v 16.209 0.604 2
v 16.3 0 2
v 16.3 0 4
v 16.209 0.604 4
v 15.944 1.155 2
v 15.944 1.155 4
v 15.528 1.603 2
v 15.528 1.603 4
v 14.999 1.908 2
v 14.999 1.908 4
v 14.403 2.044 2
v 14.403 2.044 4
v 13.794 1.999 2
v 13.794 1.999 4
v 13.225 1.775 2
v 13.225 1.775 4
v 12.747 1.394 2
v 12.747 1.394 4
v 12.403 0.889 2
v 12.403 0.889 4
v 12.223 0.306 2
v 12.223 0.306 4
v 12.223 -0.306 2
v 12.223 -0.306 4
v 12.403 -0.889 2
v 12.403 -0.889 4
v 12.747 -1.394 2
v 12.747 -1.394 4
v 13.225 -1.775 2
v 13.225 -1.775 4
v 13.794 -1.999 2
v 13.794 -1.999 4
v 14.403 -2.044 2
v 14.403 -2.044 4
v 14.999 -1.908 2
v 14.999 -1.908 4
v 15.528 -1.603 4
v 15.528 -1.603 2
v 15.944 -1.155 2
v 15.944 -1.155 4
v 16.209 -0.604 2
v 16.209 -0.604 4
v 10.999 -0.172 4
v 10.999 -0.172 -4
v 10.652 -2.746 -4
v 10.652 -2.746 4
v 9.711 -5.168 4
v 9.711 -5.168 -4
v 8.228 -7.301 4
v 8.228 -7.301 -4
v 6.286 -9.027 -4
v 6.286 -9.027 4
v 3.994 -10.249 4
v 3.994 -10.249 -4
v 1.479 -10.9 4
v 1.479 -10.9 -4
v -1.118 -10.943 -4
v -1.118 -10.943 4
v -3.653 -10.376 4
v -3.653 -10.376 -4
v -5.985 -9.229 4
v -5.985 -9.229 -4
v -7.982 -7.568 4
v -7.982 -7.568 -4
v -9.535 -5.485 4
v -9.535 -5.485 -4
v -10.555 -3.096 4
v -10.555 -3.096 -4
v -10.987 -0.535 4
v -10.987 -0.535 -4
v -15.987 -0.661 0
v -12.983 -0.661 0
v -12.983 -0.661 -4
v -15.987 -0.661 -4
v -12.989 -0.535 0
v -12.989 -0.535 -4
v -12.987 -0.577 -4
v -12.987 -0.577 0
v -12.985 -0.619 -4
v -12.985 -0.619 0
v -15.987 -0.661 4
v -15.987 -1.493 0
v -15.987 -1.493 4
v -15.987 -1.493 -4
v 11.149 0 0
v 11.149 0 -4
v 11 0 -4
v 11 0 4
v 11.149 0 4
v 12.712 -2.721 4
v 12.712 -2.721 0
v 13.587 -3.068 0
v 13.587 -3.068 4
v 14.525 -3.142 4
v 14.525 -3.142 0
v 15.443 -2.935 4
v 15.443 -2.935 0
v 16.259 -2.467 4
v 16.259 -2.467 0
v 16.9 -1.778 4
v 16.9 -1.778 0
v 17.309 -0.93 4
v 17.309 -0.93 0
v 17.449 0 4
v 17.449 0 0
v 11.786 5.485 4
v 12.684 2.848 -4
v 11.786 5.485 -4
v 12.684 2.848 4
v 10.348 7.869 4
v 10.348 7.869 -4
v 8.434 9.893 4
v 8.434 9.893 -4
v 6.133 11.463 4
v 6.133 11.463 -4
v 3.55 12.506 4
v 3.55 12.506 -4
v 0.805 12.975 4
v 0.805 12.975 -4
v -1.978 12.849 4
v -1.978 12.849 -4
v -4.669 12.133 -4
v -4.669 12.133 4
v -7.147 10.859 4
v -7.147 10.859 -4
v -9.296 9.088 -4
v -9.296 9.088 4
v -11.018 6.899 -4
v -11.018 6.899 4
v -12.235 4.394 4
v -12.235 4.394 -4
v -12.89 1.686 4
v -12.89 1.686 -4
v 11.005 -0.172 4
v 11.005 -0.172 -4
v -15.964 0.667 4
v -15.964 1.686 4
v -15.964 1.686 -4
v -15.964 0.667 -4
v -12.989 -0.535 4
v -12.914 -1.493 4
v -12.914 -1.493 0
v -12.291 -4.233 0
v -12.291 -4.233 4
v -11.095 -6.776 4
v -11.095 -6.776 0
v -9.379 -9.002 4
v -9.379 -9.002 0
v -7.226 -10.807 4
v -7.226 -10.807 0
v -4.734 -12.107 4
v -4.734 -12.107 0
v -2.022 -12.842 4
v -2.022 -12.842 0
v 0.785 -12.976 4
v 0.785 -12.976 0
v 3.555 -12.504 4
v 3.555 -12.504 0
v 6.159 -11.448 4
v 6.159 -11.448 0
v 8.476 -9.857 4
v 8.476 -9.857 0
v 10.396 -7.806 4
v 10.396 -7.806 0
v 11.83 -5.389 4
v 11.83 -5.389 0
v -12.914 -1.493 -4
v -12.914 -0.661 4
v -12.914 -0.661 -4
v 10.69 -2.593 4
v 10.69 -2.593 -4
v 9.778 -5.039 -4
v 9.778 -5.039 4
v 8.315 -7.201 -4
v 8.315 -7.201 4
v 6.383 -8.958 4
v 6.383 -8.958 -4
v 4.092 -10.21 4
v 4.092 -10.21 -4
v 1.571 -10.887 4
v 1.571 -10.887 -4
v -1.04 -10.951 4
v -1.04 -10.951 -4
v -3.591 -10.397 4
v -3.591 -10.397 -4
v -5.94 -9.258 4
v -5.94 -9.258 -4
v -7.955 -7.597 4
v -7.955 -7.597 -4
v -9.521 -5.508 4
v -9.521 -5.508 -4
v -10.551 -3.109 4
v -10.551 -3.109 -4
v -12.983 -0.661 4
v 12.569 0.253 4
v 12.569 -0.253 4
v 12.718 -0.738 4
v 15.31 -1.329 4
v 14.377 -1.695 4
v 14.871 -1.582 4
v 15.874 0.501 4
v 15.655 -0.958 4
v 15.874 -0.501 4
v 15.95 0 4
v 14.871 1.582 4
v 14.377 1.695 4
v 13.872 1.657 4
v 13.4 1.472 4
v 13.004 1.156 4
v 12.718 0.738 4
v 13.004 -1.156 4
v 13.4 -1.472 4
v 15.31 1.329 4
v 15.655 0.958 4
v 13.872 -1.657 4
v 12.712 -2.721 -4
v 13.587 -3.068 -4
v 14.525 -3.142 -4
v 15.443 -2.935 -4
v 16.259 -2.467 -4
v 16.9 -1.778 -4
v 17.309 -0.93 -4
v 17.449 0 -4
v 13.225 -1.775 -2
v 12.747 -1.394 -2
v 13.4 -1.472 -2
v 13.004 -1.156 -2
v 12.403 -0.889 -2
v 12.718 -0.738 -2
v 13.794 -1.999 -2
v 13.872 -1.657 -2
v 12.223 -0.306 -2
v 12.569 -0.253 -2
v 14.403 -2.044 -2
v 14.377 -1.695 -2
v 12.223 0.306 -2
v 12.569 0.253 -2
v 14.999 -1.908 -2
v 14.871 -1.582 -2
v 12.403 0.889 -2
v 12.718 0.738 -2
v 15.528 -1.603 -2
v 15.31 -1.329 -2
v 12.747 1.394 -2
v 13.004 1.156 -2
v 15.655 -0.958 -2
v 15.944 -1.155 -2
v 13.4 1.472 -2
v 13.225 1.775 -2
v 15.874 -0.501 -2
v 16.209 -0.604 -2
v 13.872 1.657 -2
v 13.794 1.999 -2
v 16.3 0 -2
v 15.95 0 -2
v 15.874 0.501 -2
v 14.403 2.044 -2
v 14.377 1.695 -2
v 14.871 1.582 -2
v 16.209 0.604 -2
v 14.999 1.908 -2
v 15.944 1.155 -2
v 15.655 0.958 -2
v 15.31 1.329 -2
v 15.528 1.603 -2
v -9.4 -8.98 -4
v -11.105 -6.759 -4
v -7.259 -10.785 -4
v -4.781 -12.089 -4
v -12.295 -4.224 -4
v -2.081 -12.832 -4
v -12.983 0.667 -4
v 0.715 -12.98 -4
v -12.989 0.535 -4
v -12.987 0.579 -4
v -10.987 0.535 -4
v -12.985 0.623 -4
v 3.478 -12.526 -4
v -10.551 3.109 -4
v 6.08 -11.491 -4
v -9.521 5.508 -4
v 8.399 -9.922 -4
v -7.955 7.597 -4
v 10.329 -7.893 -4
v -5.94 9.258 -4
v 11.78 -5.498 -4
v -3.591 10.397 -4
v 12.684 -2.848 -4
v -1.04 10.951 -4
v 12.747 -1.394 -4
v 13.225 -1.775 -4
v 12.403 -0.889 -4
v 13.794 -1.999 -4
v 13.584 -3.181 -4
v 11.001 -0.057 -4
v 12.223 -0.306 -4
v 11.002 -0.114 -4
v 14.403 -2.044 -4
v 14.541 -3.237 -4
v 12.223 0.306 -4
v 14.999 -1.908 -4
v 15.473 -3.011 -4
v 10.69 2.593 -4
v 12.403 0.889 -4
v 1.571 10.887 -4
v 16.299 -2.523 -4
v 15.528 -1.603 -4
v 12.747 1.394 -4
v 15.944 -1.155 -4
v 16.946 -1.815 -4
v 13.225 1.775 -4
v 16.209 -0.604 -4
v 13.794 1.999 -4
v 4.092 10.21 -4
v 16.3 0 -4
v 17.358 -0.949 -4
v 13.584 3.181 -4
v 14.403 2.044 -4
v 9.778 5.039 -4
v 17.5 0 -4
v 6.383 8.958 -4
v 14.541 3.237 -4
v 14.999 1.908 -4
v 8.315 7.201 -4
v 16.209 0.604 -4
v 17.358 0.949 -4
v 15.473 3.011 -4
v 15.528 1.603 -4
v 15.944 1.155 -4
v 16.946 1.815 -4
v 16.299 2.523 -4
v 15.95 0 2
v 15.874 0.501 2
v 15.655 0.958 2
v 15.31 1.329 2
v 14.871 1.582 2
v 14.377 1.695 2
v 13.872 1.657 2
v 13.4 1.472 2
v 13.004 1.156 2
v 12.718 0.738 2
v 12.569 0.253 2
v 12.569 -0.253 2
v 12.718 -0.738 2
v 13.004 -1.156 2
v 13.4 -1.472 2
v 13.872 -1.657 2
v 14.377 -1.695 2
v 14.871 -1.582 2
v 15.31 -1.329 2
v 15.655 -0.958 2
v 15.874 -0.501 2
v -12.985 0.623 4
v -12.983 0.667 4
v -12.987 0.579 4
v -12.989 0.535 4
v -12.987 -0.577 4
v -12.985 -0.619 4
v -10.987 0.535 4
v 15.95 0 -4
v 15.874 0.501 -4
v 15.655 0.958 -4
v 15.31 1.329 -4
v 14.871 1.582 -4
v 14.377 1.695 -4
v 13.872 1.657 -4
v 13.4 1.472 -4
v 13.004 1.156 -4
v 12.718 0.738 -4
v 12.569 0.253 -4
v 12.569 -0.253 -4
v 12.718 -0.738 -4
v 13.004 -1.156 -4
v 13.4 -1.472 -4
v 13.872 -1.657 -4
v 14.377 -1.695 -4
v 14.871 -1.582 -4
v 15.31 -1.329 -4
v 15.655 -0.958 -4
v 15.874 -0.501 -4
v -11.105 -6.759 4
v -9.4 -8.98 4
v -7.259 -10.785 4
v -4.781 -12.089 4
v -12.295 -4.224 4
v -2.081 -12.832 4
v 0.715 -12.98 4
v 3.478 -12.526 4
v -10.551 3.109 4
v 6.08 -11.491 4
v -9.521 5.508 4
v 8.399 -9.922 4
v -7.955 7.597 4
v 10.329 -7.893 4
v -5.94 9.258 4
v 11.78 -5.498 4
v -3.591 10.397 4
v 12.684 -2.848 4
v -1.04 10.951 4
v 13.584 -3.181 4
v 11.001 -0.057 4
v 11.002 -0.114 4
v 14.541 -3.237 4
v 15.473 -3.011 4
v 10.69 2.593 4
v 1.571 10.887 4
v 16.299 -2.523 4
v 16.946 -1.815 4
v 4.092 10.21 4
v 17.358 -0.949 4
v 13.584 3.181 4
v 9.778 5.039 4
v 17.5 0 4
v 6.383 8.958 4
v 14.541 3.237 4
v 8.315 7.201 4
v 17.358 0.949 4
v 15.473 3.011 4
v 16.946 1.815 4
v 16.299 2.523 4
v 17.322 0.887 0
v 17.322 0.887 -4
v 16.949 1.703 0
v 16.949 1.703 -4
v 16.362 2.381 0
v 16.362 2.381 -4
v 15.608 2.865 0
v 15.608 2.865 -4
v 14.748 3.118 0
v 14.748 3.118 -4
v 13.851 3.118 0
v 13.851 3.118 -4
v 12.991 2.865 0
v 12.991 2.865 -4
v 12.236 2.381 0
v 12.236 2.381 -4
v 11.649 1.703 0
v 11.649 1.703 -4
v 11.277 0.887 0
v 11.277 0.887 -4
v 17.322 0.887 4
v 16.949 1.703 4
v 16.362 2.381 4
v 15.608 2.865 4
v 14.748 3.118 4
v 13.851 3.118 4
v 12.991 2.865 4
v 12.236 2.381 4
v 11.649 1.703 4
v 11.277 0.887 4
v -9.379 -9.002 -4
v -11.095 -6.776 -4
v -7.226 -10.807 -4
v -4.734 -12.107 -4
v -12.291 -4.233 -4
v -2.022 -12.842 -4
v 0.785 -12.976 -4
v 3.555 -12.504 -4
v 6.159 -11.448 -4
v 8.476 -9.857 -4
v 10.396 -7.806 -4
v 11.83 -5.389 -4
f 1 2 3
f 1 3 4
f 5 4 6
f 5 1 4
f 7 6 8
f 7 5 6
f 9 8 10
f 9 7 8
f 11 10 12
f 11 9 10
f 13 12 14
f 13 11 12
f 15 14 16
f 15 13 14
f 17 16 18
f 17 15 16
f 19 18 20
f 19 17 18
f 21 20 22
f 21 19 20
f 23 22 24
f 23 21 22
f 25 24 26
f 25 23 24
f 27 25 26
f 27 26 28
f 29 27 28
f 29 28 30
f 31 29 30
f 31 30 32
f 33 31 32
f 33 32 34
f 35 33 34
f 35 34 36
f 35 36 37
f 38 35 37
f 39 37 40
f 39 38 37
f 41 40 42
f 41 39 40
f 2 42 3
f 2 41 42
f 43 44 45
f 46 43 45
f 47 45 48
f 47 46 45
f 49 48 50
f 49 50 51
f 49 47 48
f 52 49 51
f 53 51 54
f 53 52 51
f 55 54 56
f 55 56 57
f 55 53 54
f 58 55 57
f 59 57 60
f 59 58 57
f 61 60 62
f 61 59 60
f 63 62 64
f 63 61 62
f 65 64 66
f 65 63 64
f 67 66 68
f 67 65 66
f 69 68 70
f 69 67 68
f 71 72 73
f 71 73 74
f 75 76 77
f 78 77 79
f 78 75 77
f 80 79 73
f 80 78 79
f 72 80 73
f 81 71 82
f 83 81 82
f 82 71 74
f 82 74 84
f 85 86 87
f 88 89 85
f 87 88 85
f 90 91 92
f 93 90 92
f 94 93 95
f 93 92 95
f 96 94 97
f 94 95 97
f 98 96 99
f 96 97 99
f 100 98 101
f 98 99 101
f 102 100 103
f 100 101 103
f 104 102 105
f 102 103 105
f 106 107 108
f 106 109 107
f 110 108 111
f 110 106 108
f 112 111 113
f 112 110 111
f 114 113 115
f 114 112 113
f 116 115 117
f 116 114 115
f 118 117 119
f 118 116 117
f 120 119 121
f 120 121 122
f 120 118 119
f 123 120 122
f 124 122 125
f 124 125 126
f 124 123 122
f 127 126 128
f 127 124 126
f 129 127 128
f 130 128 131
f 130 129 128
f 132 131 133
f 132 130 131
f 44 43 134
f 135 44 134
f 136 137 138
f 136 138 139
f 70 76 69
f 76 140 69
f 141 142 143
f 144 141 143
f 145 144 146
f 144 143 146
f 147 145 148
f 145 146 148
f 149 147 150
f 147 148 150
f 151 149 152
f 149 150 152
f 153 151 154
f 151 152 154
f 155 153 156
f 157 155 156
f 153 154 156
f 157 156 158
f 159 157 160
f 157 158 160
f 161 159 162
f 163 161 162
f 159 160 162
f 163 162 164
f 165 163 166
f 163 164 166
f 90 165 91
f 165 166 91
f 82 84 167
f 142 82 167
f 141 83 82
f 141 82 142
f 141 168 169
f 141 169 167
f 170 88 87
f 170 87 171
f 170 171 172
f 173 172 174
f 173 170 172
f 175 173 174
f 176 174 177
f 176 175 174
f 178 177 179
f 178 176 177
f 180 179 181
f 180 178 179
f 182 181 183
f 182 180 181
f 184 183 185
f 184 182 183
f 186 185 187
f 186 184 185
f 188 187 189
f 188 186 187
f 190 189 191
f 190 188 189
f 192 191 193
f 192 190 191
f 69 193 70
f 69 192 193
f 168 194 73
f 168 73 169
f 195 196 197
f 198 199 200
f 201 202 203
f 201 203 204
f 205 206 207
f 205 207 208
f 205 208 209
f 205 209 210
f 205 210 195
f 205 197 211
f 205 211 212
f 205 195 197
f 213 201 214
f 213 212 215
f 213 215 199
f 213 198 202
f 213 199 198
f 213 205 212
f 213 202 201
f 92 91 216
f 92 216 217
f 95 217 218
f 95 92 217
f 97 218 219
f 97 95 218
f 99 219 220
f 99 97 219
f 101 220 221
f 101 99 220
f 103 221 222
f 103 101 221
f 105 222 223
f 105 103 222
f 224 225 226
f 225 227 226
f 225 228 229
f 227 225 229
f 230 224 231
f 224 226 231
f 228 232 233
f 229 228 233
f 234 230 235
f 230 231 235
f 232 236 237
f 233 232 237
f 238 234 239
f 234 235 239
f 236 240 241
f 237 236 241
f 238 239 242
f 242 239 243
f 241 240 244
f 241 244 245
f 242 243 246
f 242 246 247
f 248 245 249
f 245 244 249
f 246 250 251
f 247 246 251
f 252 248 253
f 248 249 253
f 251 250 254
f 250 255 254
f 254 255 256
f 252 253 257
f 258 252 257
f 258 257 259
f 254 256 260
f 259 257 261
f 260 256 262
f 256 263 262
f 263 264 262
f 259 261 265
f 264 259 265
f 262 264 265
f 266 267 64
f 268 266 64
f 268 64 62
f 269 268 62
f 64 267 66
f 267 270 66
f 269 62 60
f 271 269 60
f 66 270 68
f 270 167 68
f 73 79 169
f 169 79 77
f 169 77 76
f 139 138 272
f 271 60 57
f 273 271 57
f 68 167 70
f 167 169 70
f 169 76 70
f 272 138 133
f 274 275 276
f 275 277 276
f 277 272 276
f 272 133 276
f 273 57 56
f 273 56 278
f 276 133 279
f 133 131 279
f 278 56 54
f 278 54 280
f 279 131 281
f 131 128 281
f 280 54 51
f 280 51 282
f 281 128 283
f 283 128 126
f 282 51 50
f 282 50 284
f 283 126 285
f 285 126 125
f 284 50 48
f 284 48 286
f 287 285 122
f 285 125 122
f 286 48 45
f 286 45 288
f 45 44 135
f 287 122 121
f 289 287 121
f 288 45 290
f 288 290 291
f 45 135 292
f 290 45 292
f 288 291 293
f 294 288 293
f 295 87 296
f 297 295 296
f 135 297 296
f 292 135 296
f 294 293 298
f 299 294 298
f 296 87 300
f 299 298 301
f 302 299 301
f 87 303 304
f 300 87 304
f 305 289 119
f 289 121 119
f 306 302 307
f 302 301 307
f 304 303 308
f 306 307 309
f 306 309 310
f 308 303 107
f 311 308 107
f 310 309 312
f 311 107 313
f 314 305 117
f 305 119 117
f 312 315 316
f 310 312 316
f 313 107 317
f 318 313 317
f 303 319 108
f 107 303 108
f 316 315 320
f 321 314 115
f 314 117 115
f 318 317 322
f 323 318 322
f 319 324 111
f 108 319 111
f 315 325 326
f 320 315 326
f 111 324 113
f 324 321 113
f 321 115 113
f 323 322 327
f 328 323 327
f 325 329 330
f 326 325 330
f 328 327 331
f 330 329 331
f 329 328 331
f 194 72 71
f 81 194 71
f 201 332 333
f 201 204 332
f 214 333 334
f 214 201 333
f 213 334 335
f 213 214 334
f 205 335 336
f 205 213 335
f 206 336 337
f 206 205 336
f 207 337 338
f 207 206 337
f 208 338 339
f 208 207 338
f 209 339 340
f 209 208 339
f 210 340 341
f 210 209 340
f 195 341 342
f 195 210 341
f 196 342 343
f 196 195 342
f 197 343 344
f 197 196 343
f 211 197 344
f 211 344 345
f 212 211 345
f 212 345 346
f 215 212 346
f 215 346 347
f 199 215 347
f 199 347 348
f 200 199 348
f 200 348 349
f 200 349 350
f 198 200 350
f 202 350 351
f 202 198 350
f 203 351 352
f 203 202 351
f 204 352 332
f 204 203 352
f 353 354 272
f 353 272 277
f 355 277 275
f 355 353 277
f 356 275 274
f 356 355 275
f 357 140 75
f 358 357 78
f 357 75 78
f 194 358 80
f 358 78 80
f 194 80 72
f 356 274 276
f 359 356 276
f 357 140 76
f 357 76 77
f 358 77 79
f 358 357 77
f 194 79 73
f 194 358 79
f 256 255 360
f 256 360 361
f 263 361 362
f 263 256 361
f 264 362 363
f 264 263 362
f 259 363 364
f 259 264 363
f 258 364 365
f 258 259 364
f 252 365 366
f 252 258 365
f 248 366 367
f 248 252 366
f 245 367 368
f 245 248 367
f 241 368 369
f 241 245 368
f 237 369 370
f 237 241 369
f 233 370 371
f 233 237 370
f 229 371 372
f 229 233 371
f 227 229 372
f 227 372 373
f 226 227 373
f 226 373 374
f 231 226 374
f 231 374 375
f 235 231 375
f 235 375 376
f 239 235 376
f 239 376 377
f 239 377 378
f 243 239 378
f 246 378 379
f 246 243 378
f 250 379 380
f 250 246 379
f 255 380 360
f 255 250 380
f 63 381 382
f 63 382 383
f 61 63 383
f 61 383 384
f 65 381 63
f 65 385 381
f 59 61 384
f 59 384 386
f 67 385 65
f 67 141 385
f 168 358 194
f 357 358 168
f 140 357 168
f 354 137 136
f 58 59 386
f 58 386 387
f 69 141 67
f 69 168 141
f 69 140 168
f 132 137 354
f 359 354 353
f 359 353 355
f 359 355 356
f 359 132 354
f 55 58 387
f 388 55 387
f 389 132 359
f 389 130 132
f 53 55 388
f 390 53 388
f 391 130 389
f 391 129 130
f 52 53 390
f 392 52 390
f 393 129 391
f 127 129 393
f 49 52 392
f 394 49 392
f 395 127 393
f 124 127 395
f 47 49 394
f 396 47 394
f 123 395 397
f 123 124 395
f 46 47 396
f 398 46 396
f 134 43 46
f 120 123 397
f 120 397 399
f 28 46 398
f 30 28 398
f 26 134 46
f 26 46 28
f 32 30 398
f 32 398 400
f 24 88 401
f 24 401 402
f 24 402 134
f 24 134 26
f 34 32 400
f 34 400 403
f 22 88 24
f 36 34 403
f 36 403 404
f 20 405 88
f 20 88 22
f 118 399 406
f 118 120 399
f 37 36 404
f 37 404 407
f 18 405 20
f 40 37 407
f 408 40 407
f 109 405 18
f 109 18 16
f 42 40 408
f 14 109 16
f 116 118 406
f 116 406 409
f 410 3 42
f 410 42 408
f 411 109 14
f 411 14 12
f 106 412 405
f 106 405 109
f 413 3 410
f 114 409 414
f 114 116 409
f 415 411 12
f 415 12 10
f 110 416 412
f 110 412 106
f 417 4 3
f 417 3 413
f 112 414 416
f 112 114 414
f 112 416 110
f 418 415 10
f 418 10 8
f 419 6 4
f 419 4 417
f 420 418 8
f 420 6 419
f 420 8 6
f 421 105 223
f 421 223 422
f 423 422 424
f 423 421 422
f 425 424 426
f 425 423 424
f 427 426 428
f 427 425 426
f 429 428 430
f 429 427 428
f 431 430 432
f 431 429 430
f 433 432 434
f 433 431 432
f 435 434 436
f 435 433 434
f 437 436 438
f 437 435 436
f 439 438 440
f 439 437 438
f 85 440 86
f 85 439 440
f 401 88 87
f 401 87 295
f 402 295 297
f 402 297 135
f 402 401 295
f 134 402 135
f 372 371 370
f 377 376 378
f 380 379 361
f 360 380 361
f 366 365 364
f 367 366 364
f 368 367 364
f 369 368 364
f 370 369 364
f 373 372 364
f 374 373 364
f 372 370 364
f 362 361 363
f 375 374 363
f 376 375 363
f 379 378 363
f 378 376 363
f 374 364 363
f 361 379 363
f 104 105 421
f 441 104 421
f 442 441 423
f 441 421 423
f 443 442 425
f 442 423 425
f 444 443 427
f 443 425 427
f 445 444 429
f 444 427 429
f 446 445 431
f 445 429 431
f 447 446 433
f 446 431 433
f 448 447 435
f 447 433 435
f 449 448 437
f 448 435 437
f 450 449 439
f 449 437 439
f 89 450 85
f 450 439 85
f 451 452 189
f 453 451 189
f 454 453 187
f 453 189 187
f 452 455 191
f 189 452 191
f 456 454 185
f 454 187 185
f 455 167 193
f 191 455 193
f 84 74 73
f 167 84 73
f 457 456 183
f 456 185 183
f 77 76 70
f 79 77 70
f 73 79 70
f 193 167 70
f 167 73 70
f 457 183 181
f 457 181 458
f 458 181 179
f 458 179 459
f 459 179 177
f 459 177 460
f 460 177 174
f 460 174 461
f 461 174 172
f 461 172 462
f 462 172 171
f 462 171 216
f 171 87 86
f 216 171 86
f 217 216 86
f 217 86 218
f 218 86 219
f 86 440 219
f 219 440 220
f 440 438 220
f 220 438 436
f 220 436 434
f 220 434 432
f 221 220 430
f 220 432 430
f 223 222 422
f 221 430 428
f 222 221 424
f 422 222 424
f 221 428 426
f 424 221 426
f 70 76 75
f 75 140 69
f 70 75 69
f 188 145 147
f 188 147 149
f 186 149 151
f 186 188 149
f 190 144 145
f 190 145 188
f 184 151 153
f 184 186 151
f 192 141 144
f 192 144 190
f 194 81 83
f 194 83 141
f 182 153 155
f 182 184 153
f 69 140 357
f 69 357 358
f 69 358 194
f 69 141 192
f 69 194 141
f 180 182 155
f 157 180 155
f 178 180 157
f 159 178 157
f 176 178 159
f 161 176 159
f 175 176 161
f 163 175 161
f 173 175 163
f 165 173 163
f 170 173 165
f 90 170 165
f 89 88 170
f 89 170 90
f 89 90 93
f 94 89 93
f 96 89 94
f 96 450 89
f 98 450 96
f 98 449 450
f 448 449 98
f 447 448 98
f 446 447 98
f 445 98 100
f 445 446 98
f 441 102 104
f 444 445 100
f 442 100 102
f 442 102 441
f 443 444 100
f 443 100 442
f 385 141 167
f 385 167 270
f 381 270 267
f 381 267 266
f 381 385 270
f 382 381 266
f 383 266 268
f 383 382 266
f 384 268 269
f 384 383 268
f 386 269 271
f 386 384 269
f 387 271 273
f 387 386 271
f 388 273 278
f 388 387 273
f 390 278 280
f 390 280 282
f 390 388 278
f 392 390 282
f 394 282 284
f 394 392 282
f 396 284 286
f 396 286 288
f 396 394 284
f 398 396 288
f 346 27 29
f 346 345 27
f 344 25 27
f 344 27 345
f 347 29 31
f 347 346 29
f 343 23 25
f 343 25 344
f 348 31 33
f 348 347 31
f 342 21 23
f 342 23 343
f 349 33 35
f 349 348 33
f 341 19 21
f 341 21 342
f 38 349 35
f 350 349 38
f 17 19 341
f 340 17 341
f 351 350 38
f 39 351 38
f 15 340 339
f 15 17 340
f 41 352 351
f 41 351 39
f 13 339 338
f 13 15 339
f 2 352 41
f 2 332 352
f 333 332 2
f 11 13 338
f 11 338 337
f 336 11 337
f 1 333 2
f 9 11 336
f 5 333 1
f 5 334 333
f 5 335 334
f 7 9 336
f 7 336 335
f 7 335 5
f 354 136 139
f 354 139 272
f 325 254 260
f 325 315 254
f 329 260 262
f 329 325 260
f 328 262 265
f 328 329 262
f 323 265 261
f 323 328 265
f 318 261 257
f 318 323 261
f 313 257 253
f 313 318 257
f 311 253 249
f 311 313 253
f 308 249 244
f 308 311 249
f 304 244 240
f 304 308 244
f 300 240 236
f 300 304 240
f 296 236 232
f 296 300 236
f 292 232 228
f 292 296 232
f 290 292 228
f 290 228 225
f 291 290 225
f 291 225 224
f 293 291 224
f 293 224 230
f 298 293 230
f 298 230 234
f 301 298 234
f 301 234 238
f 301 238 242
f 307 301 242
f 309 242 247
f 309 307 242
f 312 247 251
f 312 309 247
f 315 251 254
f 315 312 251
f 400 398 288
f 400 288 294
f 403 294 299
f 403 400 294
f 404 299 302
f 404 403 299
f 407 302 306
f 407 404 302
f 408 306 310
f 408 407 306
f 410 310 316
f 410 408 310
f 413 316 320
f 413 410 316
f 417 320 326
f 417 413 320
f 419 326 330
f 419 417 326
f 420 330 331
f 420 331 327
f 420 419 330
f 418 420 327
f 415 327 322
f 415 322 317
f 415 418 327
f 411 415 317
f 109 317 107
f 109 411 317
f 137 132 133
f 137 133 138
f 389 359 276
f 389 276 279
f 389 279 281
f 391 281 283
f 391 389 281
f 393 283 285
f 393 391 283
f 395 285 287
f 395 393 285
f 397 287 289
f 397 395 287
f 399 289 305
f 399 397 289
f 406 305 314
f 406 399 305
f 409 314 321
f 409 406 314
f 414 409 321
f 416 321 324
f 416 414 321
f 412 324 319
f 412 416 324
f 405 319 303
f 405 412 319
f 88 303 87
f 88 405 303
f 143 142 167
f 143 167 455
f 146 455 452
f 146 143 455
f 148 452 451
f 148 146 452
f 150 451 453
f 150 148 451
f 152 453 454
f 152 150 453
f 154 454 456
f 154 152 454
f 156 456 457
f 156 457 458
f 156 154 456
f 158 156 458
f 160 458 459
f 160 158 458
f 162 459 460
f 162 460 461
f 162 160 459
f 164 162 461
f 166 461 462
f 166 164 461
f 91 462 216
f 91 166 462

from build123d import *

# Parameters (mm, degrees)
F0_R      = 2.05
F1_DEPTH  = 4
F2_DEPTH  = 2
F5_DEPTH  = 4
F6_W      = 7.8420564532
F6_H      = 1.0693569202
F7_DEPTH  = 4.5
F0_R_2    = 1.7
F8_DEPTH  = 2
F9_DEPTH  = 4
F10_W     = 1.5671141446
F10_H     = 0.3430901561
F11_DEPTH = 4
F12_DEPTH = 4
F13_DEPTH = 4
F14_DEPTH = 4


# Not quite as in the source:
# - the program builds the solid bodies; features that only make, move or delete a surface that nothing else refers to are left out


with BuildPart() as f1:
    # F0 (on Top) → F1 (new body, symmetric)
    with BuildSketch(Plane.XY):
        with BuildLine():
            ThreePointArc((-11, 0), (0, 11), (11, 0))
            ThreePointArc((11, 0), (11.4525622626, 1.6543403837), (12.6842105263, 2.8479472123))
            ThreePointArc((12.6842105263, 2.8479472123), (-0.5898274536, 12.986612475), (-12.8901523849, 1.6864078669))
            Line((-12.8901523849, 1.6864078669), (-12.8901523849, 0.6666785921))
            Line((-12.8901523849, 0.6666785921), (-12.9828941171, 0.6666785921))
            ThreePointArc((-12.9828941171, 0.6666785921), (-12.9957228256, 0.3334490052), (-13, 0))
            Line((-13, 0), (-11, 0))
        make_face()
        with BuildLine():
            ThreePointArc((12.6842105263, 2.8479472123), (11.4525622626, 1.6543403837), (11, 0))
            ThreePointArc((11, 0), (11.4525622626, -1.6543403837), (12.6842105263, -2.8479472123))
            ThreePointArc((12.6842105263, -2.8479472123), (15.9043403837, -2.7974377374), (17.5, 0))
            ThreePointArc((17.5, 0), (15.9043403837, 2.7974377374), (12.6842105263, 2.8479472123))
        make_face()
        with Locations((14.25, 0)):
            Circle(F0_R, mode=Mode.SUBTRACT)
        with BuildLine():
            Line((-12.8901523849, 0.6666785921), (-12.8901523849, 1.6864078669))
            ThreePointArc((-12.8901523849, 1.6864078669), (-12.9465669493, 1.1774566778), (-12.9828941171, 0.6666785921))
            Line((-12.9828941171, 0.6666785921), (-12.8901523849, 0.6666785921))
        make_face()
        with BuildLine():
            ThreePointArc((-12.9828941171, 0.6666785921), (-12.9465669493, 1.1774566778), (-12.8901523849, 1.6864078669))
            Line((-12.8901523849, 1.6864078669), (-15.9636270255, 1.6864078669))
            Line((-15.9636270255, 1.6864078669), (-15.9636270255, 0.6666785921))
            Line((-15.9636270255, 0.6666785921), (-12.9828941171, 0.6666785921))
        make_face()
    extrude(amount=F1_DEPTH, both=True)

    # F0 (on Top) → F2 (cut, symmetric)
    with BuildSketch(Plane.XY):
        with BuildLine():
            ThreePointArc((12.6842105263, 2.8479472123), (11.4525622626, 1.6543403837), (11, 0))
            ThreePointArc((11, 0), (11.4525622626, -1.6543403837), (12.6842105263, -2.8479472123))
            ThreePointArc((12.6842105263, -2.8479472123), (15.9043403837, -2.7974377374), (17.5, 0))
            ThreePointArc((17.5, 0), (15.9043403837, 2.7974377374), (12.6842105263, 2.8479472123))
        make_face()
        with Locations((14.25, 0)):
            Circle(F0_R, mode=Mode.SUBTRACT)
    extrude(amount=F2_DEPTH, both=True, mode=Mode.SUBTRACT)


with BuildPart() as f5:
    # F3 (on Top) → F5 (new body, symmetric)
    with BuildSketch(Plane.XY):
        with BuildLine():
            ThreePointArc((11, 0), (0, -11), (-11, 0))
            Line((-11, 0), (-13, 0))
            ThreePointArc((-13, 0), (-12.9957895083, -0.3308399253), (-12.9831607606, -0.6614655431))
            Line((-12.9831607606, -0.6614655431), (-12.9139886071, -0.6614655431))
            Line((-12.9139886071, -0.6614655431), (-12.9139886071, -1.4929495154))
            ThreePointArc((-12.9139886071, -1.4929495154), (-0.6222206293, -12.98510075), (12.7120691767, -2.7209000803))
            ThreePointArc((12.7120691767, -2.7209000803), (11.5677693449, -1.5688883132), (11.1492688343, 0))
            Line((11.1492688343, 0), (11, 0))
        make_face()
    extrude(amount=F5_DEPTH, both=True)


with BuildPart() as f7_tool:
    # F6 (on Top) → F7 (new body, symmetric)
    with BuildSketch(Plane.XY):
        with Locations((-13.9199756086, 0)):
            Rectangle(F6_W, F6_H)
    extrude(amount=F7_DEPTH, both=True)


with BuildPart() as f1_1:
    add(f1.part)

    # F7: cut by f7_tool
    add(f7_tool.part, mode=Mode.SUBTRACT)


with BuildPart() as f5_1:
    add(f5.part)

    # F7: cut by f7_tool
    add(f7_tool.part, mode=Mode.SUBTRACT)


with BuildPart() as f8:
    # F0 (on Top) → F8 (new body, symmetric)
    with BuildSketch(Plane.XY):
        with Locations((14.25, 0)):
            Circle(F0_R)
        with Locations((14.25, 0)):
            Circle(F0_R_2, mode=Mode.SUBTRACT)
    extrude(amount=F8_DEPTH, both=True)

    # F0 (on Top) → F9 (join, symmetric)
    with BuildSketch(Plane.XY):
        with Locations((14.25, 0)):
            Circle(F0_R_2)
    extrude(amount=F9_DEPTH, both=True)


with BuildPart() as f11_tool:
    # F10 (on Top) → F11 (new body, symmetric)
    with BuildSketch(Plane.XY):
        with Locations((11.4076789469, 0)):
            Rectangle(F10_W, F10_H)
    extrude(amount=F11_DEPTH, both=True)


with BuildPart() as f1_2:
    add(f1_1.part)

    # F11: cut by f11_tool
    add(f11_tool.part, mode=Mode.SUBTRACT)



with BuildPart() as f5_2:
    add(f5_1.part)

    # F11: cut by f11_tool
    add(f11_tool.part, mode=Mode.SUBTRACT)


with BuildPart() as f1_3:
    add(f1_2.part)

    add(f5_2.part)  # F12 merges F5

    add(f8.part)  # F12 merges F8
    # F0 (on Top) → F12 (join, symmetric)
    with BuildSketch(Plane.XY):
        with BuildLine():
            ThreePointArc((-11, 0), (0, 11), (11, 0))
            ThreePointArc((11, 0), (11.4525622626, 1.6543403837), (12.6842105263, 2.8479472123))
            ThreePointArc((12.6842105263, 2.8479472123), (-0.5898274536, 12.986612475), (-12.8901523849, 1.6864078669))
            Line((-12.8901523849, 1.6864078669), (-12.8901523849, 0.6666785921))
            Line((-12.8901523849, 0.6666785921), (-12.9828941171, 0.6666785921))
            ThreePointArc((-12.9828941171, 0.6666785921), (-12.9957228256, 0.3334490052), (-13, 0))
            Line((-13, 0), (-11, 0))
        make_face()
        with BuildLine():
            ThreePointArc((12.6842105263, 2.8479472123), (11.4525622626, 1.6543403837), (11, 0))
            ThreePointArc((11, 0), (11.4525622626, -1.6543403837), (12.6842105263, -2.8479472123))
            ThreePointArc((12.6842105263, -2.8479472123), (15.9043403837, -2.7974377374), (17.5, 0))
            ThreePointArc((17.5, 0), (15.9043403837, 2.7974377374), (12.6842105263, 2.8479472123))
        make_face()
        with Locations((14.25, 0)):
            Circle(F0_R, mode=Mode.SUBTRACT)
        with BuildLine():
            Line((-12.8901523849, 0.6666785921), (-12.8901523849, 1.6864078669))
            ThreePointArc((-12.8901523849, 1.6864078669), (-12.9465669493, 1.1774566778), (-12.9828941171, 0.6666785921))
            Line((-12.9828941171, 0.6666785921), (-12.8901523849, 0.6666785921))
        make_face()
        with BuildLine():
            ThreePointArc((-12.9828941171, 0.6666785921), (-12.9465669493, 1.1774566778), (-12.8901523849, 1.6864078669))
            Line((-12.8901523849, 1.6864078669), (-15.9636270255, 1.6864078669))
            Line((-15.9636270255, 1.6864078669), (-15.9636270255, 0.6666785921))
            Line((-15.9636270255, 0.6666785921), (-12.9828941171, 0.6666785921))
        make_face()
    extrude(amount=F12_DEPTH, both=True)


with BuildPart() as f13:
    # F3 (on Top) → F13 (new body, symmetric)
    with BuildSketch(Plane.XY):
        with BuildLine():
            ThreePointArc((11, 0), (0, -11), (-11, 0))
            Line((-11, 0), (-13, 0))
            ThreePointArc((-13, 0), (-12.9957895083, -0.3308399253), (-12.9831607606, -0.6614655431))
            Line((-12.9831607606, -0.6614655431), (-12.9139886071, -0.6614655431))
            Line((-12.9139886071, -0.6614655431), (-12.9139886071, -1.4929495154))
            ThreePointArc((-12.9139886071, -1.4929495154), (-0.6222206293, -12.98510075), (12.7120691767, -2.7209000803))
            ThreePointArc((12.7120691767, -2.7209000803), (11.5677693449, -1.5688883132), (11.1492688343, 0))
            Line((11.1492688343, 0), (11, 0))
        make_face()
        with BuildLine():
            ThreePointArc((17.4492688343, 0), (14.2992688343, 3.15), (11.1492688343, 0))
            Line((11.1492688343, 0), (13, 0))
            ThreePointArc((13, 0), (12.9278168941, -1.3680461803), (12.7120691767, -2.7209000803))
            ThreePointArc((12.7120691767, -2.7209000803), (15.8681571475, -2.7314994894), (17.4492688343, 0))
        make_face()
        with BuildLine():
            Line((13, 0), (11.1492688343, 0))
            ThreePointArc((11.1492688343, 0), (11.5677693449, -1.5688883132), (12.7120691767, -2.7209000803))
            ThreePointArc((12.7120691767, -2.7209000803), (12.9278168941, -1.3680461803), (13, 0))
        make_face()
        with BuildLine():
            Line((-12.9139886071, -0.6614655431), (-12.9831607606, -0.6614655431))
            ThreePointArc((-12.9831607606, -0.6614655431), (-12.9552471124, -1.0777626166), (-12.9139886071, -1.4929495154))
            Line((-12.9139886071, -1.4929495154), (-12.9139886071, -0.6614655431))
        make_face()
        with BuildLine():
            ThreePointArc((-12.9139886071, -1.4929495154), (-12.9552471124, -1.0777626166), (-12.9831607606, -0.6614655431))
            Line((-12.9831607606, -0.6614655431), (-15.9874632477, -0.6614655431))
            Line((-15.9874632477, -0.6614655431), (-15.9874632477, -1.4929495154))
            Line((-15.9874632477, -1.4929495154), (-12.9139886071, -1.4929495154))
        make_face()
    extrude(amount=F13_DEPTH, both=True)


with BuildPart() as f14_tool:
    # F6 (on Top) → F14 (new body, symmetric)
    with BuildSketch(Plane.XY):
        with Locations((-13.9199756086, 0)):
            Rectangle(F6_W, F6_H)
    extrude(amount=F14_DEPTH, both=True)


with BuildPart() as f1_4:
    add(f1_3.part)

    # F14: cut by f14_tool
    add(f14_tool.part, mode=Mode.SUBTRACT)


with BuildPart() as f13_1:
    add(f13.part)

    # F14: cut by f14_tool
    add(f14_tool.part, mode=Mode.SUBTRACT)


solid = Compound([f1_4.part, f13_1.part])
